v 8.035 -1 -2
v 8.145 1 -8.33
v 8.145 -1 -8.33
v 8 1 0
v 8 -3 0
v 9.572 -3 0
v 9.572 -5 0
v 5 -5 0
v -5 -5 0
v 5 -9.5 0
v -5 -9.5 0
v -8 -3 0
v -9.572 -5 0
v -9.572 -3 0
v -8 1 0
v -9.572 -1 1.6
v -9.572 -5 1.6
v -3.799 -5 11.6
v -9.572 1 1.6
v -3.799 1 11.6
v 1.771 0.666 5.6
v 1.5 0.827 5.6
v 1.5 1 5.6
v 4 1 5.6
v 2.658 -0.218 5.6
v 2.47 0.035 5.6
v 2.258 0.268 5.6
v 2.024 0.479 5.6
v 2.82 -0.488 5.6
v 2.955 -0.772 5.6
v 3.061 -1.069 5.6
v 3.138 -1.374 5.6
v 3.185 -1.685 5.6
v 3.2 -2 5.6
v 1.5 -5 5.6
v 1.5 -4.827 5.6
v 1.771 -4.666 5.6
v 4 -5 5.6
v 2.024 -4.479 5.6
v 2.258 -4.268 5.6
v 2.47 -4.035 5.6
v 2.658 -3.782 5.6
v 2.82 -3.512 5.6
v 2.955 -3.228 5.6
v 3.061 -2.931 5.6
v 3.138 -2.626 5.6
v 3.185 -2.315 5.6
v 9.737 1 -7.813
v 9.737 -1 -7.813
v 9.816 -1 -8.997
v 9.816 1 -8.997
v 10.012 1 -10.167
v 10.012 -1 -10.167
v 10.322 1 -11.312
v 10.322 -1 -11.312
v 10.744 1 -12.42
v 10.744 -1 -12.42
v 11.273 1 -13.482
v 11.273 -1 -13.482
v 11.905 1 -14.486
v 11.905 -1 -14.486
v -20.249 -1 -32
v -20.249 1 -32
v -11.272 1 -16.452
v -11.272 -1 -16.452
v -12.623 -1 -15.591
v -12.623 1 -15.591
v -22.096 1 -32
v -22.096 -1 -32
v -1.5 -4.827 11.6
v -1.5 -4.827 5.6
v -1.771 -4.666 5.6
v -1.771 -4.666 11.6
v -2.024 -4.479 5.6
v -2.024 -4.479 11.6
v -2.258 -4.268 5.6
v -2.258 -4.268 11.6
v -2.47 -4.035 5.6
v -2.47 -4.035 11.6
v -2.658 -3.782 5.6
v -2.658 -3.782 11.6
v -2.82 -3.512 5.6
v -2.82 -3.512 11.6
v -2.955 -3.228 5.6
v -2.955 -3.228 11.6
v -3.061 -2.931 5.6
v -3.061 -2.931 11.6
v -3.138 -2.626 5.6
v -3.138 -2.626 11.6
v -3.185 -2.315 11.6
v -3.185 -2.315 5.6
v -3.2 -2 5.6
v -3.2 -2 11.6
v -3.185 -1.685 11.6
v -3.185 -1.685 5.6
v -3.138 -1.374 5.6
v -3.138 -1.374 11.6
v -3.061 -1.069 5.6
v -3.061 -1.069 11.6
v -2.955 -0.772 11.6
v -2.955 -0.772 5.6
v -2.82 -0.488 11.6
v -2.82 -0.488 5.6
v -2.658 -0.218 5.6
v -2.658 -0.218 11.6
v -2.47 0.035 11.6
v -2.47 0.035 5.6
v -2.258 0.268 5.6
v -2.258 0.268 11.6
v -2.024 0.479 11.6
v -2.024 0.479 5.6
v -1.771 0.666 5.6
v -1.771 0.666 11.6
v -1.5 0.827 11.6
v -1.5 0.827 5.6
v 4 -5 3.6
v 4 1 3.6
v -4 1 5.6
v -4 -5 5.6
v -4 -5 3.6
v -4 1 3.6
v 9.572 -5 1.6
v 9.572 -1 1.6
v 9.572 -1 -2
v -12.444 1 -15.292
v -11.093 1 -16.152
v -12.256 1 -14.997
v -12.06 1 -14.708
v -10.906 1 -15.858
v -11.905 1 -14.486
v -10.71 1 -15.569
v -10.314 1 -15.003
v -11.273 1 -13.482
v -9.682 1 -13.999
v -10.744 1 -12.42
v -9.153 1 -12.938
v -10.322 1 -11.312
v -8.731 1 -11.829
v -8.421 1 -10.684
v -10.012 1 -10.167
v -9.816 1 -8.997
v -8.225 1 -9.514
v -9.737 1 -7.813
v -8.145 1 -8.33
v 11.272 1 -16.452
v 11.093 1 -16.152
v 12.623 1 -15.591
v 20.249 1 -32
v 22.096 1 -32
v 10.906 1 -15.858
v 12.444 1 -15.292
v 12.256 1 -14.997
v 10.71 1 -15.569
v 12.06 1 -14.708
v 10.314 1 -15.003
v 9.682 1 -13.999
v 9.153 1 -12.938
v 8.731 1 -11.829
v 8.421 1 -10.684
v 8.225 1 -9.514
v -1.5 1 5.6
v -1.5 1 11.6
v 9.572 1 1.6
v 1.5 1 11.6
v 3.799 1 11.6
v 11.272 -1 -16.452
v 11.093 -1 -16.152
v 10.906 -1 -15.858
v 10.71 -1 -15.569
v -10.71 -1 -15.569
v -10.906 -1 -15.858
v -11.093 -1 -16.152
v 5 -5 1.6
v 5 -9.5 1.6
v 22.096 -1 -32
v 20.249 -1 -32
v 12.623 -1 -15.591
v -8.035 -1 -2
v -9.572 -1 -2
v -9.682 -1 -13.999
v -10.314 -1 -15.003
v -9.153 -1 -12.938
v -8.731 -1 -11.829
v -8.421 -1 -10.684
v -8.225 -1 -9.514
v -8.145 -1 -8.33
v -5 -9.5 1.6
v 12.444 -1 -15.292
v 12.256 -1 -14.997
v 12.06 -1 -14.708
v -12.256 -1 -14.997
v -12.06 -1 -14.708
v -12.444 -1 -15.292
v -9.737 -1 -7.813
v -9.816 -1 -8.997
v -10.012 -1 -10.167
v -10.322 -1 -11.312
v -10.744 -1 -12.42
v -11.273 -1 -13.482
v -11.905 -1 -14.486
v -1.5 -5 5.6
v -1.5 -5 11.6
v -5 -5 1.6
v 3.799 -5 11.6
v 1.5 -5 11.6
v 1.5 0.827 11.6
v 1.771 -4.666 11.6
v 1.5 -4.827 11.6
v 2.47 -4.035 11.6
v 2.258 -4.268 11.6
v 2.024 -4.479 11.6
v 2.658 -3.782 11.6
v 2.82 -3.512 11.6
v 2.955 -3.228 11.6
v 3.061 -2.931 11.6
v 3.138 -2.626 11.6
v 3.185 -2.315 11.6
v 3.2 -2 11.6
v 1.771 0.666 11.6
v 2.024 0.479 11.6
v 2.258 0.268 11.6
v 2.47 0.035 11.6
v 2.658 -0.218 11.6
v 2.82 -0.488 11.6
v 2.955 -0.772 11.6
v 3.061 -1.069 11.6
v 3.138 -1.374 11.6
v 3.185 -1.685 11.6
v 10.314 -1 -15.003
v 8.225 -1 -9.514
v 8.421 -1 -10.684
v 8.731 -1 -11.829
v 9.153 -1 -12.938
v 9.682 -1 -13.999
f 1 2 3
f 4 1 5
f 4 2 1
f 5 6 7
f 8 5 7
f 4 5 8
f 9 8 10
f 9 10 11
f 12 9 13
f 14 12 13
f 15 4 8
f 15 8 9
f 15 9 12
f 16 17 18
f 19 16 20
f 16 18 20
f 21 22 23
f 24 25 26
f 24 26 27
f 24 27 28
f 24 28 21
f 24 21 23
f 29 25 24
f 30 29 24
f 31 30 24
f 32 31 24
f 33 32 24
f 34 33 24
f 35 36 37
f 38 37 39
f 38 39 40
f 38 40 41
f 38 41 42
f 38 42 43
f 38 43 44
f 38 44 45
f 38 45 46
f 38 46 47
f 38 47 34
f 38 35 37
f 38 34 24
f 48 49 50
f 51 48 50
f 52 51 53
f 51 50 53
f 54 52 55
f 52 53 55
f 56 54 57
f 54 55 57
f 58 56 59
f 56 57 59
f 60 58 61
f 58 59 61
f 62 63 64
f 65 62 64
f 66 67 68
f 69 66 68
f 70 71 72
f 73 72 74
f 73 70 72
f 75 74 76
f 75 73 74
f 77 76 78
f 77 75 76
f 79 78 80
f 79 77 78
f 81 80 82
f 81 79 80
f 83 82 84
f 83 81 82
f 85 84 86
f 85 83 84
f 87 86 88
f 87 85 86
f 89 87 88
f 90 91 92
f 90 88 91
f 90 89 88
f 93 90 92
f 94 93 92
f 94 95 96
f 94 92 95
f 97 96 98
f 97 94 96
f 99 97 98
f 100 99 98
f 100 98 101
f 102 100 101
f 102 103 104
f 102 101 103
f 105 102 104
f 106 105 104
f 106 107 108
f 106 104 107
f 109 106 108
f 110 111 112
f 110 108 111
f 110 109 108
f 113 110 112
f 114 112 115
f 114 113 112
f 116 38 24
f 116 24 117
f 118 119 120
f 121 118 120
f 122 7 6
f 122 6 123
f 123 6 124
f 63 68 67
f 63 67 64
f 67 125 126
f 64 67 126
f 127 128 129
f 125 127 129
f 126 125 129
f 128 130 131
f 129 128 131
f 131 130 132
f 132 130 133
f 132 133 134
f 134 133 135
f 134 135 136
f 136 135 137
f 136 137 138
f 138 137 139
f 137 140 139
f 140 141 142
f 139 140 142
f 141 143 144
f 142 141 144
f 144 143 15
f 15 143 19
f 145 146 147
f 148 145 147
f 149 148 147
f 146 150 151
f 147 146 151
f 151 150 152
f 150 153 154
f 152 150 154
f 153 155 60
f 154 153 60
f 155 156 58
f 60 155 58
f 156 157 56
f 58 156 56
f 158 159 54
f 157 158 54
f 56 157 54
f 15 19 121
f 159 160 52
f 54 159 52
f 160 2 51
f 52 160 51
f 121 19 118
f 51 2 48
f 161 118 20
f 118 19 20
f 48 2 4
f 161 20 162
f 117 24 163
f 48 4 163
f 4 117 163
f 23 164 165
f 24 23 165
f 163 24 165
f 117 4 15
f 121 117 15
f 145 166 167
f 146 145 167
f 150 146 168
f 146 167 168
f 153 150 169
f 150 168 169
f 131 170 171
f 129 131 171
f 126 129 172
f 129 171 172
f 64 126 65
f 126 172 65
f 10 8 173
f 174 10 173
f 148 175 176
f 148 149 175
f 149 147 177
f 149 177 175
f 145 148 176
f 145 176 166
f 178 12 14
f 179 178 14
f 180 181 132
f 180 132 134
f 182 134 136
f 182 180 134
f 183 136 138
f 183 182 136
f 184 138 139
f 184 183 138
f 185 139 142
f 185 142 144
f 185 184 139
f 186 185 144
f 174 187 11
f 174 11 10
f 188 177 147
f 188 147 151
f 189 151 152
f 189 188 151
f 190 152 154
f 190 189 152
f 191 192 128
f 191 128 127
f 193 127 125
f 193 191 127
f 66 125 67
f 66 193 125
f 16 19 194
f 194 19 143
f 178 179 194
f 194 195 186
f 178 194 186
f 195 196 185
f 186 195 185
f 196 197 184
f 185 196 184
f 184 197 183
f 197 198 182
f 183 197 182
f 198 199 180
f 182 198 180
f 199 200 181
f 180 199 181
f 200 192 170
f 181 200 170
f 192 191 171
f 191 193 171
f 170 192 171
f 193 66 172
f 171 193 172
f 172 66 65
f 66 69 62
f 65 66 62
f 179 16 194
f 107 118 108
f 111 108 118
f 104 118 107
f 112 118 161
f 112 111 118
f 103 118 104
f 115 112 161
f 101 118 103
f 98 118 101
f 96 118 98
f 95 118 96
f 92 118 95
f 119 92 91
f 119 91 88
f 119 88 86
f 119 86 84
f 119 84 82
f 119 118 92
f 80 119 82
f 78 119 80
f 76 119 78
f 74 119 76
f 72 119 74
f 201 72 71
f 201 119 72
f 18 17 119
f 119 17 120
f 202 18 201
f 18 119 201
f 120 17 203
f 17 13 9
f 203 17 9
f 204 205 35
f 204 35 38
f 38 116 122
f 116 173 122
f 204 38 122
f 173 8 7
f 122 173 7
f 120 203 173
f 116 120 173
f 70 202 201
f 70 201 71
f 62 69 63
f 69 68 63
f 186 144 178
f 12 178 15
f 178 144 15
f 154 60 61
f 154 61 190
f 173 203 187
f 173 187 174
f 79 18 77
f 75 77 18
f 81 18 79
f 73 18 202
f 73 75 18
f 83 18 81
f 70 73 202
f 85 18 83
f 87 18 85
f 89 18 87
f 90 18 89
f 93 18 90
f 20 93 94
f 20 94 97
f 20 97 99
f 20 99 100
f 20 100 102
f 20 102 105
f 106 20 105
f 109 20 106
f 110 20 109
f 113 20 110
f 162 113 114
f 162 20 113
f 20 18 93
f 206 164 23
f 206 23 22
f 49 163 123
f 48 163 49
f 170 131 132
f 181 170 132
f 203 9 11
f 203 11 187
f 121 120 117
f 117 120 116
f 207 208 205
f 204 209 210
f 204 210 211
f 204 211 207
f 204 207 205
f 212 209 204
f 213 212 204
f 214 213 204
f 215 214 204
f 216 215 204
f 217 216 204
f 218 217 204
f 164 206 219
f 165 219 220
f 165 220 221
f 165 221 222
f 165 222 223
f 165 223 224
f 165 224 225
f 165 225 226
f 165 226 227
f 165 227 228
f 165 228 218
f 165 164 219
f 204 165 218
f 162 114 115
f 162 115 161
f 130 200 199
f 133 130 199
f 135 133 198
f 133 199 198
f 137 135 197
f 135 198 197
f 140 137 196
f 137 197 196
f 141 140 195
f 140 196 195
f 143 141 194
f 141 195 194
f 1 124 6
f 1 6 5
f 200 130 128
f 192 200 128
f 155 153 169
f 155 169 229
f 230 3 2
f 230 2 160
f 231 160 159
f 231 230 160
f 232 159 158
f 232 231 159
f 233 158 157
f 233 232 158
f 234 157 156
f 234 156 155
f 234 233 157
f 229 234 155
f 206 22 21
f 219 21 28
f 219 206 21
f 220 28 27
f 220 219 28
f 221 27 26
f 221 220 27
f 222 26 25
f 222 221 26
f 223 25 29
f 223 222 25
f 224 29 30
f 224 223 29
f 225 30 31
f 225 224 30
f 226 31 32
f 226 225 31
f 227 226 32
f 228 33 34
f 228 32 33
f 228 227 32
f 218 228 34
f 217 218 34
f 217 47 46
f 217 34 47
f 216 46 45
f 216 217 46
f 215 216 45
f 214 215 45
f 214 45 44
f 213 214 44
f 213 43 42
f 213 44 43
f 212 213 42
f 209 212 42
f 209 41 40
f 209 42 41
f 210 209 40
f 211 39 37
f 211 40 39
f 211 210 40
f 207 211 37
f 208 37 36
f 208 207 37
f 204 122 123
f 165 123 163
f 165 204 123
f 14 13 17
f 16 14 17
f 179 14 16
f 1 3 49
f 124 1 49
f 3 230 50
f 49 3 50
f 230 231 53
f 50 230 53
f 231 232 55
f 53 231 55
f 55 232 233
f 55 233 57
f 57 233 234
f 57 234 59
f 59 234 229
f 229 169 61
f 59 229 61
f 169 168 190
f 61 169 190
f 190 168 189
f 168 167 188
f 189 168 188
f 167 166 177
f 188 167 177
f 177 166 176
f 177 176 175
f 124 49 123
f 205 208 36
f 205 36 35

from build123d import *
from OCP.BRepFilletAPI import BRepFilletAPI_MakeChamfer

# Parameters (mm, degrees)
BOSS_EXTRUDE1_DEPTH             = 1
BOSS_EXTRUDE2_REACH             = 42.227
SKETCH2_W                       = 19.144631242
SKETCH2_H                       = 6
BOSS_EXTRUDE2_DIRECTION_2_DEPTH = 10
CUT_EXTRUDE1_DEPTH              = 8
CUT_EXTRUDE2_DEPTH              = 40.207813431
CUT_EXTRUDE2_DEPTH_BACK         = 40.207813431
SKETCH4_W                       = 8
SKETCH4_H                       = 2
CHAMFER1_SIZE                   = 2
CHAMFER2_SIZE                   = 10
CHAMFER2_SIZE2                  = 5.773502692
FILLET1_START                   = -1
FILLET1_DEPTH                   = 3
FILLET1_2_DEPTH                 = 2
BOSS_EXTRUDE3_START             = -6
SKETCH5_W                       = 10
SKETCH5_H                       = 1.6
BOSS_EXTRUDE3_DEPTH             = 10.5


with BuildPart() as part:
    # Sketch1 → Boss-Extrude1 (new, symmetric)
    with BuildSketch(Plane(origin=(0, 0, 0), x_dir=(1, 0, 0), z_dir=(0, 1, 0))):
        Polygon((-8, 0), (0, 0), (0, -1.6), (-9.572315621, -1.6), (-9.800648012, 11.481153904), (-12.360970922, 15.137673965), (-22.096439397, 32), (-20.248918536, 32), (-11.01025903, 15.998172342), (-8.209428877, 11.998172342), align=None)
    boss_extrude1 = extrude(amount=BOSS_EXTRUDE1_DEPTH, both=True)

    # Mirror1: Boss-Extrude1 across plane
    add(boss_extrude1.mirror(Plane(origin=(0, 1, 0), x_dir=(0, 0, 1), z_dir=(-1, 0, 0))))

    # Boss-Extrude2: up to this face of the body (flat: up to its plane)
    boss_extrude2_end = Plane(part.part.faces().sort_by_distance((0, 0, 0))[0])
    # Sketch2 → Boss-Extrude2 (add, up to the picked face)
    with BuildSketch(Plane.XY.offset(1.6), mode=Mode.PRIVATE) as boss_extrude2_sk1:
        with Locations((0, -2)):
            Rectangle(SKETCH2_W, SKETCH2_H)
    boss_extrude2_tool1 = split(extrude(boss_extrude2_sk1.sketch, amount=-BOSS_EXTRUDE2_REACH, mode=Mode.PRIVATE), bisect_by=boss_extrude2_end, keep=Keep.BOTH, mode=Mode.PRIVATE)
    add(boss_extrude2_tool1.solids().sort_by(Axis((0, -2, 1.6), (0, 0, -1)))[0])

    # Sketch2 → Boss-Extrude2 direction 2 (add)
    with BuildSketch(Plane.XY.offset(1.6)):
        with Locations((0, -2)):
            Rectangle(SKETCH2_W, SKETCH2_H)
    extrude(amount=BOSS_EXTRUDE2_DIRECTION_2_DEPTH)

    # Sketch3 → Cut-Extrude1 (cut)
    with BuildSketch(Plane.XY.offset(11.6)):
        with BuildLine():
            Line((-1.5, 0.826658805), (-1.5, 1))
            Line((-1.5, 1), (1.5, 1))
            Line((1.5, 1), (1.5, 0.826658805))
            ThreePointArc((1.5, 0.826658805), (3.2, -2), (1.5, -4.826658805))
            Line((1.5, -4.826658805), (1.5, -5))
            Line((1.5, -5), (-1.5, -5))
            Line((-1.5, -5), (-1.5, -4.826658805))
            ThreePointArc((-1.5, -4.826658805), (-3.2, -2), (-1.5, 0.826658805))
        make_face()
    extrude(amount=-CUT_EXTRUDE1_DEPTH, mode=Mode.SUBTRACT)

    # Sketch4 → Cut-Extrude2 (cut, two sides: drawn at the far end of the back side and taken through both)
    with BuildSketch(Plane(origin=(0, 0, 0), x_dir=(1, 0, 0), z_dir=(0, 1, 0)).offset(-CUT_EXTRUDE2_DEPTH_BACK)):
        with Locations((0, -4.6)):
            Rectangle(SKETCH4_W, SKETCH4_H)
    extrude(amount=CUT_EXTRUDE2_DEPTH + CUT_EXTRUDE2_DEPTH_BACK, mode=Mode.SUBTRACT)

    # Chamfer1
    chamfer1_edges = [part.edges().sort_by_distance(p)[0] for p in [
        (-8.78615781, -1, 0),
        (8.78615781, -1, 0),
    ]]
    chamfer(chamfer1_edges, length=CHAMFER1_SIZE)

    # Chamfer2: one chamfer whose edges measure the first distance from different faces: ONE call of the kernel's chamfer builder (chamfer() names one face for all edges)
    chamfer2_edges_1 = [part.edges().sort_by_distance(p)[0] for p in [
        (9.572315621, -2, 11.6),
    ]]
    chamfer2_side_1 = [part.faces().sort_by_distance(p)[0] for p in [
        (9.572315621, -2.083820663, 5.844834308),
    ]]
    chamfer2_edges_2 = [part.edges().sort_by_distance(p)[0] for p in [
        (-9.572315621, -2, 11.6),
    ]]
    chamfer2_side_2 = [part.faces().sort_by_distance(p)[0] for p in [
        (-9.572315621, -2.083820663, 5.844834308),
    ]]
    chamfer2 = BRepFilletAPI_MakeChamfer(part.part.solid().wrapped)
    for e in chamfer2_edges_1:
        chamfer2.Add(CHAMFER2_SIZE, CHAMFER2_SIZE2, e.wrapped, chamfer2_side_1[0].wrapped)  # the first distance lies on this face
    for e in chamfer2_edges_2:
        chamfer2.Add(CHAMFER2_SIZE, CHAMFER2_SIZE2, e.wrapped, chamfer2_side_2[0].wrapped)  # the first distance lies on this face
    add(Compound.cast(chamfer2.Shape()), mode=Mode.REPLACE)

    # Fillet1: read off the stored shape, not the designer's step
    # Fillet1 outline → Fillet1 (cut)
    with BuildSketch(Plane(origin=(0, 0, 0), x_dir=(1, 0, 0), z_dir=(0, 1, 0)).offset(FILLET1_START)):
        with BuildLine():
            Line((12.360970922, 15.137673965), (12.622936579, 15.591411793))
            ThreePointArc((12.622936579, 15.591411793), (12.351329084, 15.143816493), (12.060456265, 14.708494557))
            Line((12.060456265, 14.708494557), (12.360970922, 15.137673965))
        make_face()
        with BuildLine():
            ThreePointArc((8.145400044, 8.329962936), (8.73089419, 11.828737991), (10.313747854, 15.003451295))
            Line((10.313747854, 15.003451295), (8.209428877, 11.998172342))
            Line((8.209428877, 11.998172342), (8.145400044, 8.329962936))
        make_face()
        with BuildLine():
            Line((-12.360970922, 15.137673965), (-12.060456265, 14.708494557))
            ThreePointArc((-12.060456265, 14.708494557), (-12.351329084, 15.143816493), (-12.622936579, 15.591411793))
            Line((-12.622936579, 15.591411793), (-12.360970922, 15.137673965))
        make_face()
        with BuildLine():
            Line((-8.209428877, 11.998172342), (-10.313747854, 15.003451295))
            ThreePointArc((-10.313747854, 15.003451295), (-8.73089419, 11.828737991), (-8.145400044, 8.329962936))
            Line((-8.145400044, 8.329962936), (-8.209428877, 11.998172342))
        make_face()
    extrude(amount=FILLET1_DEPTH, mode=Mode.SUBTRACT)

    # Fillet1 2 outline → Fillet1 2 (add)
    with BuildSketch(Plane(origin=(0, 0, 0), x_dir=(1, 0, 0), z_dir=(0, 1, 0)).offset(FILLET1_START)):
        with BuildLine():
            ThreePointArc((9.736619178, 7.812944498), (10.322113325, 11.311719553), (11.904966989, 14.486432857))
            Line((11.904966989, 14.486432857), (9.800648012, 11.481153904))
            Line((9.800648012, 11.481153904), (9.736619178, 7.812944498))
        make_face()
        with BuildLine():
            ThreePointArc((11.272224688, 16.45191017), (11.000617192, 16.00431487), (10.709744374, 15.568992934))
            Line((10.709744374, 15.568992934), (11.01025903, 15.998172342))
            Line((11.01025903, 15.998172342), (11.272224688, 16.45191017))
        make_face()
        with BuildLine():
            Line((-9.800648012, 11.481153904), (-11.904966989, 14.486432857))
            ThreePointArc((-11.904966989, 14.486432857), (-10.322113325, 11.311719553), (-9.736619178, 7.812944498))
            Line((-9.736619178, 7.812944498), (-9.800648012, 11.481153904))
        make_face()
        with BuildLine():
            ThreePointArc((-10.709744374, 15.568992934), (-11.000617192, 16.00431487), (-11.272224688, 16.45191017))
            Line((-11.272224688, 16.45191017), (-11.01025903, 15.998172342))
            Line((-11.01025903, 15.998172342), (-10.709744374, 15.568992934))
        make_face()
    extrude(amount=FILLET1_2_DEPTH)

    # Sketch5 → Boss-Extrude3 (add)
    with BuildSketch(Plane.XZ.offset(5).offset(BOSS_EXTRUDE3_START)):
        with Locations((0, 0.8)):
            Rectangle(SKETCH5_W, SKETCH5_H)
    extrude(amount=BOSS_EXTRUDE3_DEPTH)


solid = part.part
